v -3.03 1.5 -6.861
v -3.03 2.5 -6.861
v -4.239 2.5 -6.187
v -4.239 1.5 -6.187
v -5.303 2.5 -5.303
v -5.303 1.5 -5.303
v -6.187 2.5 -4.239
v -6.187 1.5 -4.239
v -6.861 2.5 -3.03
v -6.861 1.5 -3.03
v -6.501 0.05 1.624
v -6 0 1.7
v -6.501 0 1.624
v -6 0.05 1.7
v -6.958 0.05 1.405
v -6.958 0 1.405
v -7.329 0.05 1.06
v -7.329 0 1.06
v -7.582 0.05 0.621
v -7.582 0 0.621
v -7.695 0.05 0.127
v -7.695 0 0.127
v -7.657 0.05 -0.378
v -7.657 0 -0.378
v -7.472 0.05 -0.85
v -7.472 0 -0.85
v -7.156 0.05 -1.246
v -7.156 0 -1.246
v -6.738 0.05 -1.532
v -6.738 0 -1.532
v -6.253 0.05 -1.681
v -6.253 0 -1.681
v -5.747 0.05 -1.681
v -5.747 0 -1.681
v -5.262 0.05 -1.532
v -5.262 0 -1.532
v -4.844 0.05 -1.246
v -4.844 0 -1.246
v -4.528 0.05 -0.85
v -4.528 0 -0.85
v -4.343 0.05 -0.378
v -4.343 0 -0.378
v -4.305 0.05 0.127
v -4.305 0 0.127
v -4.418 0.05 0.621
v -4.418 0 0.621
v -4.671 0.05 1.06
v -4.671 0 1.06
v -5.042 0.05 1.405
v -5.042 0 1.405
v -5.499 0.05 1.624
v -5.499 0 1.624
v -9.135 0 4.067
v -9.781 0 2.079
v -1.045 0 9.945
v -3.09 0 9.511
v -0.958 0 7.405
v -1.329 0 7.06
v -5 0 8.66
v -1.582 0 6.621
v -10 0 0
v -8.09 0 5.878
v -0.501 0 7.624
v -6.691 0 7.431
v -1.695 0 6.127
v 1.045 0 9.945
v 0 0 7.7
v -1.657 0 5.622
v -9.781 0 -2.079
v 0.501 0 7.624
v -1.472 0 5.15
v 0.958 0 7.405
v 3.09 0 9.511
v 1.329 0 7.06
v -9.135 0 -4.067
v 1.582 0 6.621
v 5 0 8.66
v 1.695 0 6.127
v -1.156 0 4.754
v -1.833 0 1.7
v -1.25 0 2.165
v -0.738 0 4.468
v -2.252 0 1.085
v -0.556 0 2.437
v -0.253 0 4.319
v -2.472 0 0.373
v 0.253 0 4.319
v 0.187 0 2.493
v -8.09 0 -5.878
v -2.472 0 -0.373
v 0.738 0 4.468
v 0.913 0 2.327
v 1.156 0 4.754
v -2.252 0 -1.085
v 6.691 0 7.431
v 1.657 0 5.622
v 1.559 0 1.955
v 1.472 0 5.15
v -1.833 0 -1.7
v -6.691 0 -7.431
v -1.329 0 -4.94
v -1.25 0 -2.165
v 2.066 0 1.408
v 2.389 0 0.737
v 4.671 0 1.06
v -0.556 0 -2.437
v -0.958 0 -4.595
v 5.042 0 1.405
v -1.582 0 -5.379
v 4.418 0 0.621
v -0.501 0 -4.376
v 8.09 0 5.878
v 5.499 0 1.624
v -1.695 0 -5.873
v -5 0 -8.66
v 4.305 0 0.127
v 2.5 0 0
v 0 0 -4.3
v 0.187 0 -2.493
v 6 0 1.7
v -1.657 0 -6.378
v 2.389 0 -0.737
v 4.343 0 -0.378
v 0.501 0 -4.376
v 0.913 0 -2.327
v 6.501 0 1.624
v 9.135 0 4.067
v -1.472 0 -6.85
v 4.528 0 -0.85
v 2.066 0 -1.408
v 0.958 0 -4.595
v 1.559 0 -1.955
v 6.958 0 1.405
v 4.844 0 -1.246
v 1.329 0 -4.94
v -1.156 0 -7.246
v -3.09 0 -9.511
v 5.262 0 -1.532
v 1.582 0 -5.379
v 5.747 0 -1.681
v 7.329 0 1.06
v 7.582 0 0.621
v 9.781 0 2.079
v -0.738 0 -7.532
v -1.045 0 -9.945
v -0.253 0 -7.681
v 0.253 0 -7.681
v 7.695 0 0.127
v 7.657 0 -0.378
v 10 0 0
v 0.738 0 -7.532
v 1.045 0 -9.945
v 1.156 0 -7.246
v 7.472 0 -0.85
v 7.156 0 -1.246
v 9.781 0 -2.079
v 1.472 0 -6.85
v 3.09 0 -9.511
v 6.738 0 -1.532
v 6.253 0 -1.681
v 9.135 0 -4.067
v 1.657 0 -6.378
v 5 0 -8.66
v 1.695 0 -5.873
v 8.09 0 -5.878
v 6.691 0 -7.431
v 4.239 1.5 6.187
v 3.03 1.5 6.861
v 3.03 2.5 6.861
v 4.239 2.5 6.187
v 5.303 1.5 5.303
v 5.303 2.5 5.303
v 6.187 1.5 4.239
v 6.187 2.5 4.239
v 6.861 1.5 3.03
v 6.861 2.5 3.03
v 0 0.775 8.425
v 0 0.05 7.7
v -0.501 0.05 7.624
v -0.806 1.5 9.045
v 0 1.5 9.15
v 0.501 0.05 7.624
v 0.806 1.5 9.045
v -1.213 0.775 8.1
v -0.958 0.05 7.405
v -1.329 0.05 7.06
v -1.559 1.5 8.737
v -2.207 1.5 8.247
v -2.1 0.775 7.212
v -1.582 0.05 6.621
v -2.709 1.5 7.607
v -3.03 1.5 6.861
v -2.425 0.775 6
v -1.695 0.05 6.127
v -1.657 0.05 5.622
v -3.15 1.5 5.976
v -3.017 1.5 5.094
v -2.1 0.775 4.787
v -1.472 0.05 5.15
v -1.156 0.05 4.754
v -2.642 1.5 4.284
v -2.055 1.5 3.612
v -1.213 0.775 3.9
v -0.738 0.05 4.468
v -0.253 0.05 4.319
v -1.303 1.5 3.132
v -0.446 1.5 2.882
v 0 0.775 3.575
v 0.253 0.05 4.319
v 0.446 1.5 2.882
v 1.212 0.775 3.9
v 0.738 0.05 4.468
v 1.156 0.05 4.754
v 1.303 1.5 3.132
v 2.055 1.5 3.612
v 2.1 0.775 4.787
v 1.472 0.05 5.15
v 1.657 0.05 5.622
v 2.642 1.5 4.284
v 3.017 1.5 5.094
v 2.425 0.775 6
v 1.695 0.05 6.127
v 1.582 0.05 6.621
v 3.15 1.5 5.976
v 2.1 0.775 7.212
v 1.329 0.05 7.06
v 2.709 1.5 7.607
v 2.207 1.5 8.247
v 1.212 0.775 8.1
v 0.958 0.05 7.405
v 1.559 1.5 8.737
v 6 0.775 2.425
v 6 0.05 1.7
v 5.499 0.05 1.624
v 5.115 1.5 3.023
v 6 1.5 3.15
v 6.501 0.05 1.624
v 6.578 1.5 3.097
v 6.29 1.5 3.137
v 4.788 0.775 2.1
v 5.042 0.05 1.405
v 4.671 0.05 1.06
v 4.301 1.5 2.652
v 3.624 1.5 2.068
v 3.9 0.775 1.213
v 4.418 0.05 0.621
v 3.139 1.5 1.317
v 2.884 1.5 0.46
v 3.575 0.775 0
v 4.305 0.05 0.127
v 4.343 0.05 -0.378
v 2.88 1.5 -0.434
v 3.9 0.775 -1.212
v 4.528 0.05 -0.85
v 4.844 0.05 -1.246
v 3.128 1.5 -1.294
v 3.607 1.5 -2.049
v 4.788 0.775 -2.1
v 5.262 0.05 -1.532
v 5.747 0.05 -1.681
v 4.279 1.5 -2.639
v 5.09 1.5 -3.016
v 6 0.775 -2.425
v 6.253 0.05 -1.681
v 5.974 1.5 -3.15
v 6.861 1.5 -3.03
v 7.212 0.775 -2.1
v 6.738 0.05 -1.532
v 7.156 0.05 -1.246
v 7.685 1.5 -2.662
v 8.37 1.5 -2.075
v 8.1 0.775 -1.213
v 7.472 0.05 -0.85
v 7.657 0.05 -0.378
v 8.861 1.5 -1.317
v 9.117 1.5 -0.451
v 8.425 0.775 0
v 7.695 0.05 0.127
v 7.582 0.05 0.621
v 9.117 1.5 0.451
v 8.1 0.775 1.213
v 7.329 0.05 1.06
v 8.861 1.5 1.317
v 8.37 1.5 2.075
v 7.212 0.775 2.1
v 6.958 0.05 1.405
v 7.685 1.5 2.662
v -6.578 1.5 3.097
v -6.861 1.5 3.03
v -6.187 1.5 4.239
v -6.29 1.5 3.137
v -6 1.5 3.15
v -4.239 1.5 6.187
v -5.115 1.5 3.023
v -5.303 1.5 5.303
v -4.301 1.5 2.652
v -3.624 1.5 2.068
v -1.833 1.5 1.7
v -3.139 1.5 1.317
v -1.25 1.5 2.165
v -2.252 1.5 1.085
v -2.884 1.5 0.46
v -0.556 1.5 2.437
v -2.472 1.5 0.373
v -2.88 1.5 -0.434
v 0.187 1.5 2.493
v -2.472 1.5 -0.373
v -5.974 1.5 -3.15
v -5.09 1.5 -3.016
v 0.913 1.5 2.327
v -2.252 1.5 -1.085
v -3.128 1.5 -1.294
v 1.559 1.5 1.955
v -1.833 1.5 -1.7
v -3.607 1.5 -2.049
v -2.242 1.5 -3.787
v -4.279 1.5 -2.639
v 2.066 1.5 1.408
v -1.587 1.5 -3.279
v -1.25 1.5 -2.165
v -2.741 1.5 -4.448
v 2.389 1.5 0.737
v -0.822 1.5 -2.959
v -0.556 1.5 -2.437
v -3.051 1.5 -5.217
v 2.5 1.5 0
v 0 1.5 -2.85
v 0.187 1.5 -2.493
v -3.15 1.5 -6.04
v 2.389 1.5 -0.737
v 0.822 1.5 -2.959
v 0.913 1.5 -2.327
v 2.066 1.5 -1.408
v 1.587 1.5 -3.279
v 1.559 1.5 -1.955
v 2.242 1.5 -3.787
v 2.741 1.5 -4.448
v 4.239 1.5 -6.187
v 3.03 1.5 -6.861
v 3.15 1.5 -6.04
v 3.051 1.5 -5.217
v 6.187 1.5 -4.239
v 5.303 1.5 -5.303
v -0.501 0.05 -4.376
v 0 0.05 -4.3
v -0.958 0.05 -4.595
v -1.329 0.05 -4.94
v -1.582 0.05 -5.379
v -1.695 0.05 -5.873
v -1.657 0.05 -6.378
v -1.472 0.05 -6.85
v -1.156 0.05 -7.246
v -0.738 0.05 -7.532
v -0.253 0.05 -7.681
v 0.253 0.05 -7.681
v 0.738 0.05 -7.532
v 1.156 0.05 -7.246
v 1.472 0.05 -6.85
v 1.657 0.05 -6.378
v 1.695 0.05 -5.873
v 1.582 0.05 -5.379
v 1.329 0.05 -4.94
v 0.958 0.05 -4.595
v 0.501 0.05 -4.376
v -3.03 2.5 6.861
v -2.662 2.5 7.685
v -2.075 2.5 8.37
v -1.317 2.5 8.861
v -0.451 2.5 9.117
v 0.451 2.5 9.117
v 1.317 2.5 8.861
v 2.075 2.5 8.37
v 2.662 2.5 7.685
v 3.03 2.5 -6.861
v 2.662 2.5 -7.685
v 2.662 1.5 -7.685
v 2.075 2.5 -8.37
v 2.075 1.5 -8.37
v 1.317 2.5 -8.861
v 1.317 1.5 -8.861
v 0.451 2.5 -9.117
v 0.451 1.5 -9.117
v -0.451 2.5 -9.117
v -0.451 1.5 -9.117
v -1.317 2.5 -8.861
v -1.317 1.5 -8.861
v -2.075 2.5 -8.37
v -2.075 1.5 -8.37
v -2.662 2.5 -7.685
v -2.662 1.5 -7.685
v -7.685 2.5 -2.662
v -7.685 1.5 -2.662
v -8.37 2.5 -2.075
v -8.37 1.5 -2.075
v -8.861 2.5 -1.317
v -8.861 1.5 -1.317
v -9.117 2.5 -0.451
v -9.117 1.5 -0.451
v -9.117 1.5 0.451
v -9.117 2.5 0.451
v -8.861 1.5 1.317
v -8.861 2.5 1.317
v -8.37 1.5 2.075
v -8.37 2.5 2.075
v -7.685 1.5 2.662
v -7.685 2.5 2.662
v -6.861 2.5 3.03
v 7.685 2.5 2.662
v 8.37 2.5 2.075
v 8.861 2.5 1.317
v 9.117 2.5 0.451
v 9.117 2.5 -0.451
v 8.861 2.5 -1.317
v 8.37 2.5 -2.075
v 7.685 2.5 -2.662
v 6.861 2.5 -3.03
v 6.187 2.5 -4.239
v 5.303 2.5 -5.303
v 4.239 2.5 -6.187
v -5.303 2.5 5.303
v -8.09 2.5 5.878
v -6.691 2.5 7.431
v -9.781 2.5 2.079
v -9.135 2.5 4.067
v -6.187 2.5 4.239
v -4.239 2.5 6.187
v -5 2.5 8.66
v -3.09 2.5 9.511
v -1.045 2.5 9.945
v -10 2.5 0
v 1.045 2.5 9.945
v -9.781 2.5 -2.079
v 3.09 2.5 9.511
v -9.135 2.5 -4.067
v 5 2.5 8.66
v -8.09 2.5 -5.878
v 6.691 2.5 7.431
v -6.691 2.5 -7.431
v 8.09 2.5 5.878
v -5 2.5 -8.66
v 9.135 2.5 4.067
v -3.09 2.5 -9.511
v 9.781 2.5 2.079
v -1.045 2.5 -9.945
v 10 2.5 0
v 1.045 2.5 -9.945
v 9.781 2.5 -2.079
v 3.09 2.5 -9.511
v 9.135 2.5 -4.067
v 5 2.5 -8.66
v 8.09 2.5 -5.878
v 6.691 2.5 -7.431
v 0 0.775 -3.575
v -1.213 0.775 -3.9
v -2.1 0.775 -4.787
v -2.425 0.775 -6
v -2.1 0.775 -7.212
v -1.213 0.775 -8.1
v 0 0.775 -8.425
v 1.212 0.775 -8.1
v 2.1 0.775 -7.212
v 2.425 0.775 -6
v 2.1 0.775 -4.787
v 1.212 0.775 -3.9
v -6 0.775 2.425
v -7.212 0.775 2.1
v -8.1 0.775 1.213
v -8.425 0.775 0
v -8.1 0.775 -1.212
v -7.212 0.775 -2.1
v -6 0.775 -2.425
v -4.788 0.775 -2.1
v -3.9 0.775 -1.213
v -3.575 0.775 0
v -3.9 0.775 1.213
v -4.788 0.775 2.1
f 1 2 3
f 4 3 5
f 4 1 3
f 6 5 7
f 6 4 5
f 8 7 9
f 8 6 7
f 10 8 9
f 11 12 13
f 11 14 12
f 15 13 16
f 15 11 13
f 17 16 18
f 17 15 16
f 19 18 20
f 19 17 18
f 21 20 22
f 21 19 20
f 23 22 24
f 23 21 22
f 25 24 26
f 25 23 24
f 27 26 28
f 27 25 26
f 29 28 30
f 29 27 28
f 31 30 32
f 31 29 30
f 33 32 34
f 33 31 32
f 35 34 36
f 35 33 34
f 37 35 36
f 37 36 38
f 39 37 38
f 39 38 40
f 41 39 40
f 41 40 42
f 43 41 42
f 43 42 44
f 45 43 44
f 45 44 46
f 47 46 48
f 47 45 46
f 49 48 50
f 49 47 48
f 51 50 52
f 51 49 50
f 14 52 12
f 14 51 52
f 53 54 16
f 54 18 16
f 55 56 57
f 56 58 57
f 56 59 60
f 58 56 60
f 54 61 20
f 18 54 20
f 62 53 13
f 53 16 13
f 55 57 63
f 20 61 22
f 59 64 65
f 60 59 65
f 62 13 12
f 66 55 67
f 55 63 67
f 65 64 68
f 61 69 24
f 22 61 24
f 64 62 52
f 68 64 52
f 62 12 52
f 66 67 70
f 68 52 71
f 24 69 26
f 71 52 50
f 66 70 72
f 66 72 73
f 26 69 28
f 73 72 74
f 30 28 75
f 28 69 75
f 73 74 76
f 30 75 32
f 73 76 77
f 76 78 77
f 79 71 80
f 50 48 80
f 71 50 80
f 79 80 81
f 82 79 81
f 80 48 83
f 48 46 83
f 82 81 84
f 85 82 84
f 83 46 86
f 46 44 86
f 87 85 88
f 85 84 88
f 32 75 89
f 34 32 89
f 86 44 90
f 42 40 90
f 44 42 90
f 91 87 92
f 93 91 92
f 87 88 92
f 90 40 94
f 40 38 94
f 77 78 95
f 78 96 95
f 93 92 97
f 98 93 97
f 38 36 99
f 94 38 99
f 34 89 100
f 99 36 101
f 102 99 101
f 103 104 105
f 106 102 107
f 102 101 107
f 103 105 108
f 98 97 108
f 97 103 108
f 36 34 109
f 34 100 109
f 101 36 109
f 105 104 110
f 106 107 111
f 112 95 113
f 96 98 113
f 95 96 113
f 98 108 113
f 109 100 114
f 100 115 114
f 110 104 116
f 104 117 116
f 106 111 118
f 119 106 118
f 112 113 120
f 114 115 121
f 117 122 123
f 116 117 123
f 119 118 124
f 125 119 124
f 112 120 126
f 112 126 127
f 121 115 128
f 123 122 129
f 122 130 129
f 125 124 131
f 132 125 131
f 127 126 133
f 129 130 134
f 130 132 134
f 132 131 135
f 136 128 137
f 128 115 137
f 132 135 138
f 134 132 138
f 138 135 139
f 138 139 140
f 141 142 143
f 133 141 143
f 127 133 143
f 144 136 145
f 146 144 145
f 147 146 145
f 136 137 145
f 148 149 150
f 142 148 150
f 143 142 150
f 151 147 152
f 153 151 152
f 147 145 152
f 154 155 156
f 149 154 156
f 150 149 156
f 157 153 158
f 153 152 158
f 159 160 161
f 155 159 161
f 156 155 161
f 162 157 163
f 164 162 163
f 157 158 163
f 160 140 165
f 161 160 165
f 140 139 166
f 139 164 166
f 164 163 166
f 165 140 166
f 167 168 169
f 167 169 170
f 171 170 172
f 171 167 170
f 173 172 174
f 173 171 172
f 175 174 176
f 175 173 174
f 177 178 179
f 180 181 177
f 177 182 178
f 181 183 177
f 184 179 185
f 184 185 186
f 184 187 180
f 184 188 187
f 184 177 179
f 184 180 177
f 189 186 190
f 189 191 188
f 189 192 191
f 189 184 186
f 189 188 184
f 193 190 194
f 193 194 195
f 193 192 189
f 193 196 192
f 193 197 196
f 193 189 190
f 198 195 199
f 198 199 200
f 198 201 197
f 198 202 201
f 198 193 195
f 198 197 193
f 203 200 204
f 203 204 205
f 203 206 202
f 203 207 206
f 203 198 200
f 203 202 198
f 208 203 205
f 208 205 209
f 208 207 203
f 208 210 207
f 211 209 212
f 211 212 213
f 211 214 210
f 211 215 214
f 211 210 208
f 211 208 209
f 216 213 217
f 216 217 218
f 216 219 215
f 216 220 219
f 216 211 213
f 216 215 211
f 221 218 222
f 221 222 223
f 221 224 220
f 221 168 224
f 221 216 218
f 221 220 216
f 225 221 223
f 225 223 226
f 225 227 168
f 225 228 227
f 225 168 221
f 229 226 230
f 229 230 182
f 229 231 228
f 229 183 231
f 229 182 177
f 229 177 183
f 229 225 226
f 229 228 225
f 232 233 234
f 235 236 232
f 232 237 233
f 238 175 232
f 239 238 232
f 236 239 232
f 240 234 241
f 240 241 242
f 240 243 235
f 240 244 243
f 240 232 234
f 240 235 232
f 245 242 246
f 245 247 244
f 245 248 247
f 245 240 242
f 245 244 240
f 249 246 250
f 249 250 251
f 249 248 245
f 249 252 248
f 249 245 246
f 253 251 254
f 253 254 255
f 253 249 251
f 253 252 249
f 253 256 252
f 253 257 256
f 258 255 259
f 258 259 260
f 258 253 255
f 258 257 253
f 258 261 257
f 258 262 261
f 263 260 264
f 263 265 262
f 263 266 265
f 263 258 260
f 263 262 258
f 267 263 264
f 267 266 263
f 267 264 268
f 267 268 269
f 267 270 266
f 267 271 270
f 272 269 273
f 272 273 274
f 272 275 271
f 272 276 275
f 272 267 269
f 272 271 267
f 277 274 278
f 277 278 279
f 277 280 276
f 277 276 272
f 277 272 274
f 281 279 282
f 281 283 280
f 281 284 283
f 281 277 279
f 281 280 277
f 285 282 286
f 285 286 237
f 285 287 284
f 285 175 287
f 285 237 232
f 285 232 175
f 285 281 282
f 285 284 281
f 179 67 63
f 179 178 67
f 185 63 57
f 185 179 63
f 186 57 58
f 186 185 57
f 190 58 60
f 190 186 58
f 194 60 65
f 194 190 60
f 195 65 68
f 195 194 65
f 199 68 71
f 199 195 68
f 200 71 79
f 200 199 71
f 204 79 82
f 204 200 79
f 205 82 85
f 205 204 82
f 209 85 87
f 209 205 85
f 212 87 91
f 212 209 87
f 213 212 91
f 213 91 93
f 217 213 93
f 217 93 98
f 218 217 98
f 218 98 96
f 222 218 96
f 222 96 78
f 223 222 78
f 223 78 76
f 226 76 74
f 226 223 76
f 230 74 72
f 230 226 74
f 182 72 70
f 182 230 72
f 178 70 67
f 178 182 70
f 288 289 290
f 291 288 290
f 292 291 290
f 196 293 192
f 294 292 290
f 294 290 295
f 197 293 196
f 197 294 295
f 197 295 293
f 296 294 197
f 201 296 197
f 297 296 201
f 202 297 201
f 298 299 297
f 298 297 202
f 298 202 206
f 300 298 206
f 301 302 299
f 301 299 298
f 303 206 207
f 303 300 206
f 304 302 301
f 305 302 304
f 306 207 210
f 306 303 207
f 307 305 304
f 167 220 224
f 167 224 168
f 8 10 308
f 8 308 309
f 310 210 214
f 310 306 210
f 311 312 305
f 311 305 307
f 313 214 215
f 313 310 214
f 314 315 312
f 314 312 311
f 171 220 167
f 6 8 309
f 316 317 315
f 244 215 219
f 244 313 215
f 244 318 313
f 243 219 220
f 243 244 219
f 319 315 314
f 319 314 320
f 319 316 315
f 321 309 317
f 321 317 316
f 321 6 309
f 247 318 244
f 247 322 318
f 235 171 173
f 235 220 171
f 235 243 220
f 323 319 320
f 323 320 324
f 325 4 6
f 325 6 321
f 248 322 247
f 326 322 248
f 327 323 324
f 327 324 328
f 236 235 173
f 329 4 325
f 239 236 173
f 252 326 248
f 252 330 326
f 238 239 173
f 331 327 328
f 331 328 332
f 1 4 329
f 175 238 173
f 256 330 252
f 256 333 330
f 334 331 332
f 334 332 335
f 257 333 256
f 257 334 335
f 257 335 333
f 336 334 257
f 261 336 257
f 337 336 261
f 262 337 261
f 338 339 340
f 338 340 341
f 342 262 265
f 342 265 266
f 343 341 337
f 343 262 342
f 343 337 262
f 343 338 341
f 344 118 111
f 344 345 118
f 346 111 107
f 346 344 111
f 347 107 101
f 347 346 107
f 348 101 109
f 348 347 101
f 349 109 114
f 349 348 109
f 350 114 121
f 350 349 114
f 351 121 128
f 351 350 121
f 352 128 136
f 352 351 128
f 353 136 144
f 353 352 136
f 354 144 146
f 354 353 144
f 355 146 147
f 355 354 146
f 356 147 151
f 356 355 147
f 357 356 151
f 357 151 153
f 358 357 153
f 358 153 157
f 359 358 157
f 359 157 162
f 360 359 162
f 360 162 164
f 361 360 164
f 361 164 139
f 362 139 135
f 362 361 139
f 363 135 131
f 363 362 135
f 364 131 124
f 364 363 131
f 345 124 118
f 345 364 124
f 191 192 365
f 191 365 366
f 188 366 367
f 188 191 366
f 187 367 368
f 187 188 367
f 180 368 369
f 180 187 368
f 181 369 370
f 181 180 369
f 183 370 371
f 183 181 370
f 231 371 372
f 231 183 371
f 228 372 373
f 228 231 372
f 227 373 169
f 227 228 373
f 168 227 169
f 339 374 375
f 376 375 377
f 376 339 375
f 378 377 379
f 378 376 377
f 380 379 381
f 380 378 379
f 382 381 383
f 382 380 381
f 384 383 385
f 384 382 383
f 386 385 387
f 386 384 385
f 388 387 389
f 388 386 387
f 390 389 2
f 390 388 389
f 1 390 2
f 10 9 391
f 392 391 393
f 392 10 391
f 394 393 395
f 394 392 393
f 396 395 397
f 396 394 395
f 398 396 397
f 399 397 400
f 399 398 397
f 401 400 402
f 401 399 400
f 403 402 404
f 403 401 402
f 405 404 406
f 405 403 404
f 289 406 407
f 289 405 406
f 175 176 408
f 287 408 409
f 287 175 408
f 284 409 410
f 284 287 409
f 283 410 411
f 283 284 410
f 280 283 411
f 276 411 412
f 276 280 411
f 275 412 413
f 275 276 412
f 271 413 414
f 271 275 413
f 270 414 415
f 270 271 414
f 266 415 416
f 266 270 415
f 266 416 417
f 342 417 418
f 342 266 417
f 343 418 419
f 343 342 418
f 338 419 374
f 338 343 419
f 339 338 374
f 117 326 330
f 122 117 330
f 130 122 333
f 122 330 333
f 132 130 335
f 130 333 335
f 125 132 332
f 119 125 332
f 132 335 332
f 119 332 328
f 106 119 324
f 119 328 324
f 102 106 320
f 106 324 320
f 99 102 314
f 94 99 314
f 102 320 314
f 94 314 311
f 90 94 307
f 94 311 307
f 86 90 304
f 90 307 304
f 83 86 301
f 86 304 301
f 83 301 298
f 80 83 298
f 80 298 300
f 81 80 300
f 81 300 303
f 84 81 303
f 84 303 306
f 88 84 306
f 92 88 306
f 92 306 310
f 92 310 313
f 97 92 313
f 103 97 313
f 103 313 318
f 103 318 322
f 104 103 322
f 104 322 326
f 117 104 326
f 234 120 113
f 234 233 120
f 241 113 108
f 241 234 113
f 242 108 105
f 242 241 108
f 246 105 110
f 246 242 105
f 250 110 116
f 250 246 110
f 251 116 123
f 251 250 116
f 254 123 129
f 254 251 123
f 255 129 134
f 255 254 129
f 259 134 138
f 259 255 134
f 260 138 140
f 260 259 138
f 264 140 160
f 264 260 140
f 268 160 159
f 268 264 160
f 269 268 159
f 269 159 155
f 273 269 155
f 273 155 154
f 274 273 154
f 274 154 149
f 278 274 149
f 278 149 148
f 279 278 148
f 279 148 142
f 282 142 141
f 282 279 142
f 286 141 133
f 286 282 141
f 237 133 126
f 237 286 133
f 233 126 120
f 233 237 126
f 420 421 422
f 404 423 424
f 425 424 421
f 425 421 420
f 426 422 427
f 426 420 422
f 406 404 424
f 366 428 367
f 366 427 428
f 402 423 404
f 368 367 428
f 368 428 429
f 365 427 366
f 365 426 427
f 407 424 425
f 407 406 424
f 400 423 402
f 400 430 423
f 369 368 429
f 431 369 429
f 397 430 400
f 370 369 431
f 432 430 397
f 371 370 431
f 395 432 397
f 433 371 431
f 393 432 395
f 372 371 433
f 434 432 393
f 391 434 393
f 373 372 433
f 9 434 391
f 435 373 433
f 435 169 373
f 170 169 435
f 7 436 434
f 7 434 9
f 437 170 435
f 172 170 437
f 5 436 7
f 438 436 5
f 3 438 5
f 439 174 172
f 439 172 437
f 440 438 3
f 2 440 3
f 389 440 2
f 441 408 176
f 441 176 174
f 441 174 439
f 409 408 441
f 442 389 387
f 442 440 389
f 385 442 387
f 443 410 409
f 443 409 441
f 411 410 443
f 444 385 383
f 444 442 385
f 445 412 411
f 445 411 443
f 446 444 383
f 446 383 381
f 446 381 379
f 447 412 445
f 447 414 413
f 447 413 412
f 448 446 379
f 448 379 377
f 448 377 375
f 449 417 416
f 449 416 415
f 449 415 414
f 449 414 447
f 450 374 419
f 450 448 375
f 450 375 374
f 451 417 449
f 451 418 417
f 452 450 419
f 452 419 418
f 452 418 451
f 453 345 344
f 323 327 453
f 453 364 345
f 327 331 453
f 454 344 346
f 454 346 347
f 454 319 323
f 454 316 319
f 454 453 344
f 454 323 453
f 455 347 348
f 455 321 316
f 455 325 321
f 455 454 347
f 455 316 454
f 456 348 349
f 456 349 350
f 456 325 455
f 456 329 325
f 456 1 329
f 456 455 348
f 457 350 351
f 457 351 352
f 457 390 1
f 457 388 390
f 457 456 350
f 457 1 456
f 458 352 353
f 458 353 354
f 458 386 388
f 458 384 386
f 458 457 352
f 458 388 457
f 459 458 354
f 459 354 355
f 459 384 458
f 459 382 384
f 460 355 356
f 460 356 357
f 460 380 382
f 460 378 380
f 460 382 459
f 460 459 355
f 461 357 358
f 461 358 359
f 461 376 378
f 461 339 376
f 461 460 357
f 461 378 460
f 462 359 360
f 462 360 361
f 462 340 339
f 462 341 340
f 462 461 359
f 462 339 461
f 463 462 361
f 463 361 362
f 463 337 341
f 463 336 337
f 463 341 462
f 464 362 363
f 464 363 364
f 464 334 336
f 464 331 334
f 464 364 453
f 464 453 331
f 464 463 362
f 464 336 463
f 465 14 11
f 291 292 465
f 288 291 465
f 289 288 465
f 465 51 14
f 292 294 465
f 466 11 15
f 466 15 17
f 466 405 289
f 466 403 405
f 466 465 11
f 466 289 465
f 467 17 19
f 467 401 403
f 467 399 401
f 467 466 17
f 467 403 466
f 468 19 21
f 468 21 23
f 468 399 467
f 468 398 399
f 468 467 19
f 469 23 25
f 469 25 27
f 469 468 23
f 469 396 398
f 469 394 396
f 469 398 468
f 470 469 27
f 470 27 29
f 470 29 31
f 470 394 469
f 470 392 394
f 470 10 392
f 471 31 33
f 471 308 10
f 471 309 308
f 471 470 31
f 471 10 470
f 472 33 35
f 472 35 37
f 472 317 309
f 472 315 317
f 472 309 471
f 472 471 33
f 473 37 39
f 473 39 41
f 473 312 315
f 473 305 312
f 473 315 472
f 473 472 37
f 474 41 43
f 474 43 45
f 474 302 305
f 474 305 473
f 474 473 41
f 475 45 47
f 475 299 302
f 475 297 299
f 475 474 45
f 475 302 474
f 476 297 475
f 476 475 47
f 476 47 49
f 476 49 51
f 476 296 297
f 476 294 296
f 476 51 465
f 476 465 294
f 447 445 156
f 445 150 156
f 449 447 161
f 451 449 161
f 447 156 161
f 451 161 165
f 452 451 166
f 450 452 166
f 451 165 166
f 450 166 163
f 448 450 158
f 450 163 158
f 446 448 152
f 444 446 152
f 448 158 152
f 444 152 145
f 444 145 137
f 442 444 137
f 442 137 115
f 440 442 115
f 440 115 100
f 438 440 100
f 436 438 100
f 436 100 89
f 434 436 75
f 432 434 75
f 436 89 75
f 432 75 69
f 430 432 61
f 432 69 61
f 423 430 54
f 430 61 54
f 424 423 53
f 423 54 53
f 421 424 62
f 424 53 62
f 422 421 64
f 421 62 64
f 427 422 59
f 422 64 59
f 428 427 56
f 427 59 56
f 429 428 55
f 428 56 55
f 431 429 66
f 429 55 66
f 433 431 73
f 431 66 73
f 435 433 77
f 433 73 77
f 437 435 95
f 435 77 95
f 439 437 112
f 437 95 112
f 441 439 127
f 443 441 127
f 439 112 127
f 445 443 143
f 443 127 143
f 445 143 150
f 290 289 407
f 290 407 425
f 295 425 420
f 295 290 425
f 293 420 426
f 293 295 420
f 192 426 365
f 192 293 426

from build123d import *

# Parameters (mm, degrees)
SKETCH1_R                                    = 10
BOSS_EXTRUDE1_DEPTH                          = 1.5
SKETCH2_R                                    = 10
SKETCH2_R_2                                  = 7.5
BOSS_EXTRUDE2_DEPTH                          = 1
CSK_FOR_M3_COUNTERSUNK_FLAT_HEAD_SCR_2_COUNT = 2
CSK_FOR_M3_COUNTERSUNK_FLAT_HEAD_SCR_2_PITCH = 8.485281374
CSK_FOR_M3_COUNTERSUNK_FLAT_HEAD_SCR_3_COUNT = 2
CSK_FOR_M3_COUNTERSUNK_FLAT_HEAD_SCR_3_PITCH = 12
CSK_FOR_M3_COUNTERSUNK_FLAT_HEAD_SCR_4_COUNT = 2
CSK_FOR_M3_COUNTERSUNK_FLAT_HEAD_SCR_4_PITCH = 8.485281374
SKETCH5_R                                    = 3.15
CUT_EXTRUDE1_DEPTH                           = 21
SKETCH6_R                                    = 2.5
CUT_EXTRUDE2_DEPTH                           = 2
CUT_EXTRUDE2_DEPTH_BACK                      = 2.5


with BuildPart() as part:
    # Sketch1 → Boss-Extrude1 (new body)
    with BuildSketch(Plane(origin=(0, 0, 0), x_dir=(1, 0, 0), z_dir=(0, 1, 0))):
        Circle(SKETCH1_R)
    extrude(amount=BOSS_EXTRUDE1_DEPTH)

    # Sketch2 → Boss-Extrude2 (add)
    with BuildSketch(Plane(origin=(0, 1.5, 0), x_dir=(1, 0, 0), z_dir=(0, 1, 0))):
        Circle(SKETCH2_R)
        Circle(SKETCH2_R_2, mode=Mode.SUBTRACT)
    extrude(amount=BOSS_EXTRUDE2_DEPTH)

    # Sketch4 → CSK for M3 Countersunk Flat Head Screw1 (revolve, cut)
    with BuildSketch(Plane(origin=(-6, 1.5, 0), x_dir=(0, 0, 1), z_dir=(1, 0, 0))):
        Polygon((0, 0), (0, 1.5), (1.7, 1.5), (1.7, 1.45), (3.15, 0), align=None)
    csk_for_m3_countersunk_flat_head_screw1 = revolve(axis=Axis((-6, 7.85, 0), (0, -1, 0)), mode=Mode.SUBTRACT)

    # CSK for M3 Countersunk Flat Head Scr 2: CSK for M3 Countersunk Flat Head Screw1 ×2
    with Locations(*[Vector(0.707106781, 0, -0.707106781) * (i * CSK_FOR_M3_COUNTERSUNK_FLAT_HEAD_SCR_2_PITCH) for i in range(1, CSK_FOR_M3_COUNTERSUNK_FLAT_HEAD_SCR_2_COUNT)]):
        add(csk_for_m3_countersunk_flat_head_screw1, mode=Mode.SUBTRACT)

    # CSK for M3 Countersunk Flat Head Scr 3: CSK for M3 Countersunk Flat Head Screw1 ×2
    with Locations(*[(i * CSK_FOR_M3_COUNTERSUNK_FLAT_HEAD_SCR_3_PITCH, 0, 0) for i in range(1, CSK_FOR_M3_COUNTERSUNK_FLAT_HEAD_SCR_3_COUNT)]):
        add(csk_for_m3_countersunk_flat_head_screw1, mode=Mode.SUBTRACT)

    # CSK for M3 Countersunk Flat Head Scr 4: CSK for M3 Countersunk Flat Head Screw1 ×2
    with Locations(*[Vector(0.707106781, 0, 0.707106781) * (i * CSK_FOR_M3_COUNTERSUNK_FLAT_HEAD_SCR_4_PITCH) for i in range(1, CSK_FOR_M3_COUNTERSUNK_FLAT_HEAD_SCR_4_COUNT)]):
        add(csk_for_m3_countersunk_flat_head_screw1, mode=Mode.SUBTRACT)

    # Sketch5 → Cut-Extrude1 (cut)
    with BuildSketch(Plane(origin=(0, 1.5, 0), x_dir=(1, 0, 0), z_dir=(0, 1, 0))):
        with Locations((6, 0)):
            Circle(SKETCH5_R)
        with Locations((0, -6)):
            Circle(SKETCH5_R)
        with Locations((-6, 0)):
            Circle(SKETCH5_R)
        with Locations((0, 6)):
            Circle(SKETCH5_R)
    extrude(amount=CUT_EXTRUDE1_DEPTH, mode=Mode.SUBTRACT)

    # Sketch6 → Cut-Extrude2 (cut, two sides)
    with BuildSketch(Plane(origin=(0, 1.5, 0), x_dir=(1, 0, 0), z_dir=(0, 1, 0))) as cut_extrude2_sk:
        Circle(SKETCH6_R)
    extrude(amount=CUT_EXTRUDE2_DEPTH, mode=Mode.SUBTRACT)
    extrude(cut_extrude2_sk.sketch, amount=-CUT_EXTRUDE2_DEPTH_BACK, mode=Mode.SUBTRACT)


solid = part.part
